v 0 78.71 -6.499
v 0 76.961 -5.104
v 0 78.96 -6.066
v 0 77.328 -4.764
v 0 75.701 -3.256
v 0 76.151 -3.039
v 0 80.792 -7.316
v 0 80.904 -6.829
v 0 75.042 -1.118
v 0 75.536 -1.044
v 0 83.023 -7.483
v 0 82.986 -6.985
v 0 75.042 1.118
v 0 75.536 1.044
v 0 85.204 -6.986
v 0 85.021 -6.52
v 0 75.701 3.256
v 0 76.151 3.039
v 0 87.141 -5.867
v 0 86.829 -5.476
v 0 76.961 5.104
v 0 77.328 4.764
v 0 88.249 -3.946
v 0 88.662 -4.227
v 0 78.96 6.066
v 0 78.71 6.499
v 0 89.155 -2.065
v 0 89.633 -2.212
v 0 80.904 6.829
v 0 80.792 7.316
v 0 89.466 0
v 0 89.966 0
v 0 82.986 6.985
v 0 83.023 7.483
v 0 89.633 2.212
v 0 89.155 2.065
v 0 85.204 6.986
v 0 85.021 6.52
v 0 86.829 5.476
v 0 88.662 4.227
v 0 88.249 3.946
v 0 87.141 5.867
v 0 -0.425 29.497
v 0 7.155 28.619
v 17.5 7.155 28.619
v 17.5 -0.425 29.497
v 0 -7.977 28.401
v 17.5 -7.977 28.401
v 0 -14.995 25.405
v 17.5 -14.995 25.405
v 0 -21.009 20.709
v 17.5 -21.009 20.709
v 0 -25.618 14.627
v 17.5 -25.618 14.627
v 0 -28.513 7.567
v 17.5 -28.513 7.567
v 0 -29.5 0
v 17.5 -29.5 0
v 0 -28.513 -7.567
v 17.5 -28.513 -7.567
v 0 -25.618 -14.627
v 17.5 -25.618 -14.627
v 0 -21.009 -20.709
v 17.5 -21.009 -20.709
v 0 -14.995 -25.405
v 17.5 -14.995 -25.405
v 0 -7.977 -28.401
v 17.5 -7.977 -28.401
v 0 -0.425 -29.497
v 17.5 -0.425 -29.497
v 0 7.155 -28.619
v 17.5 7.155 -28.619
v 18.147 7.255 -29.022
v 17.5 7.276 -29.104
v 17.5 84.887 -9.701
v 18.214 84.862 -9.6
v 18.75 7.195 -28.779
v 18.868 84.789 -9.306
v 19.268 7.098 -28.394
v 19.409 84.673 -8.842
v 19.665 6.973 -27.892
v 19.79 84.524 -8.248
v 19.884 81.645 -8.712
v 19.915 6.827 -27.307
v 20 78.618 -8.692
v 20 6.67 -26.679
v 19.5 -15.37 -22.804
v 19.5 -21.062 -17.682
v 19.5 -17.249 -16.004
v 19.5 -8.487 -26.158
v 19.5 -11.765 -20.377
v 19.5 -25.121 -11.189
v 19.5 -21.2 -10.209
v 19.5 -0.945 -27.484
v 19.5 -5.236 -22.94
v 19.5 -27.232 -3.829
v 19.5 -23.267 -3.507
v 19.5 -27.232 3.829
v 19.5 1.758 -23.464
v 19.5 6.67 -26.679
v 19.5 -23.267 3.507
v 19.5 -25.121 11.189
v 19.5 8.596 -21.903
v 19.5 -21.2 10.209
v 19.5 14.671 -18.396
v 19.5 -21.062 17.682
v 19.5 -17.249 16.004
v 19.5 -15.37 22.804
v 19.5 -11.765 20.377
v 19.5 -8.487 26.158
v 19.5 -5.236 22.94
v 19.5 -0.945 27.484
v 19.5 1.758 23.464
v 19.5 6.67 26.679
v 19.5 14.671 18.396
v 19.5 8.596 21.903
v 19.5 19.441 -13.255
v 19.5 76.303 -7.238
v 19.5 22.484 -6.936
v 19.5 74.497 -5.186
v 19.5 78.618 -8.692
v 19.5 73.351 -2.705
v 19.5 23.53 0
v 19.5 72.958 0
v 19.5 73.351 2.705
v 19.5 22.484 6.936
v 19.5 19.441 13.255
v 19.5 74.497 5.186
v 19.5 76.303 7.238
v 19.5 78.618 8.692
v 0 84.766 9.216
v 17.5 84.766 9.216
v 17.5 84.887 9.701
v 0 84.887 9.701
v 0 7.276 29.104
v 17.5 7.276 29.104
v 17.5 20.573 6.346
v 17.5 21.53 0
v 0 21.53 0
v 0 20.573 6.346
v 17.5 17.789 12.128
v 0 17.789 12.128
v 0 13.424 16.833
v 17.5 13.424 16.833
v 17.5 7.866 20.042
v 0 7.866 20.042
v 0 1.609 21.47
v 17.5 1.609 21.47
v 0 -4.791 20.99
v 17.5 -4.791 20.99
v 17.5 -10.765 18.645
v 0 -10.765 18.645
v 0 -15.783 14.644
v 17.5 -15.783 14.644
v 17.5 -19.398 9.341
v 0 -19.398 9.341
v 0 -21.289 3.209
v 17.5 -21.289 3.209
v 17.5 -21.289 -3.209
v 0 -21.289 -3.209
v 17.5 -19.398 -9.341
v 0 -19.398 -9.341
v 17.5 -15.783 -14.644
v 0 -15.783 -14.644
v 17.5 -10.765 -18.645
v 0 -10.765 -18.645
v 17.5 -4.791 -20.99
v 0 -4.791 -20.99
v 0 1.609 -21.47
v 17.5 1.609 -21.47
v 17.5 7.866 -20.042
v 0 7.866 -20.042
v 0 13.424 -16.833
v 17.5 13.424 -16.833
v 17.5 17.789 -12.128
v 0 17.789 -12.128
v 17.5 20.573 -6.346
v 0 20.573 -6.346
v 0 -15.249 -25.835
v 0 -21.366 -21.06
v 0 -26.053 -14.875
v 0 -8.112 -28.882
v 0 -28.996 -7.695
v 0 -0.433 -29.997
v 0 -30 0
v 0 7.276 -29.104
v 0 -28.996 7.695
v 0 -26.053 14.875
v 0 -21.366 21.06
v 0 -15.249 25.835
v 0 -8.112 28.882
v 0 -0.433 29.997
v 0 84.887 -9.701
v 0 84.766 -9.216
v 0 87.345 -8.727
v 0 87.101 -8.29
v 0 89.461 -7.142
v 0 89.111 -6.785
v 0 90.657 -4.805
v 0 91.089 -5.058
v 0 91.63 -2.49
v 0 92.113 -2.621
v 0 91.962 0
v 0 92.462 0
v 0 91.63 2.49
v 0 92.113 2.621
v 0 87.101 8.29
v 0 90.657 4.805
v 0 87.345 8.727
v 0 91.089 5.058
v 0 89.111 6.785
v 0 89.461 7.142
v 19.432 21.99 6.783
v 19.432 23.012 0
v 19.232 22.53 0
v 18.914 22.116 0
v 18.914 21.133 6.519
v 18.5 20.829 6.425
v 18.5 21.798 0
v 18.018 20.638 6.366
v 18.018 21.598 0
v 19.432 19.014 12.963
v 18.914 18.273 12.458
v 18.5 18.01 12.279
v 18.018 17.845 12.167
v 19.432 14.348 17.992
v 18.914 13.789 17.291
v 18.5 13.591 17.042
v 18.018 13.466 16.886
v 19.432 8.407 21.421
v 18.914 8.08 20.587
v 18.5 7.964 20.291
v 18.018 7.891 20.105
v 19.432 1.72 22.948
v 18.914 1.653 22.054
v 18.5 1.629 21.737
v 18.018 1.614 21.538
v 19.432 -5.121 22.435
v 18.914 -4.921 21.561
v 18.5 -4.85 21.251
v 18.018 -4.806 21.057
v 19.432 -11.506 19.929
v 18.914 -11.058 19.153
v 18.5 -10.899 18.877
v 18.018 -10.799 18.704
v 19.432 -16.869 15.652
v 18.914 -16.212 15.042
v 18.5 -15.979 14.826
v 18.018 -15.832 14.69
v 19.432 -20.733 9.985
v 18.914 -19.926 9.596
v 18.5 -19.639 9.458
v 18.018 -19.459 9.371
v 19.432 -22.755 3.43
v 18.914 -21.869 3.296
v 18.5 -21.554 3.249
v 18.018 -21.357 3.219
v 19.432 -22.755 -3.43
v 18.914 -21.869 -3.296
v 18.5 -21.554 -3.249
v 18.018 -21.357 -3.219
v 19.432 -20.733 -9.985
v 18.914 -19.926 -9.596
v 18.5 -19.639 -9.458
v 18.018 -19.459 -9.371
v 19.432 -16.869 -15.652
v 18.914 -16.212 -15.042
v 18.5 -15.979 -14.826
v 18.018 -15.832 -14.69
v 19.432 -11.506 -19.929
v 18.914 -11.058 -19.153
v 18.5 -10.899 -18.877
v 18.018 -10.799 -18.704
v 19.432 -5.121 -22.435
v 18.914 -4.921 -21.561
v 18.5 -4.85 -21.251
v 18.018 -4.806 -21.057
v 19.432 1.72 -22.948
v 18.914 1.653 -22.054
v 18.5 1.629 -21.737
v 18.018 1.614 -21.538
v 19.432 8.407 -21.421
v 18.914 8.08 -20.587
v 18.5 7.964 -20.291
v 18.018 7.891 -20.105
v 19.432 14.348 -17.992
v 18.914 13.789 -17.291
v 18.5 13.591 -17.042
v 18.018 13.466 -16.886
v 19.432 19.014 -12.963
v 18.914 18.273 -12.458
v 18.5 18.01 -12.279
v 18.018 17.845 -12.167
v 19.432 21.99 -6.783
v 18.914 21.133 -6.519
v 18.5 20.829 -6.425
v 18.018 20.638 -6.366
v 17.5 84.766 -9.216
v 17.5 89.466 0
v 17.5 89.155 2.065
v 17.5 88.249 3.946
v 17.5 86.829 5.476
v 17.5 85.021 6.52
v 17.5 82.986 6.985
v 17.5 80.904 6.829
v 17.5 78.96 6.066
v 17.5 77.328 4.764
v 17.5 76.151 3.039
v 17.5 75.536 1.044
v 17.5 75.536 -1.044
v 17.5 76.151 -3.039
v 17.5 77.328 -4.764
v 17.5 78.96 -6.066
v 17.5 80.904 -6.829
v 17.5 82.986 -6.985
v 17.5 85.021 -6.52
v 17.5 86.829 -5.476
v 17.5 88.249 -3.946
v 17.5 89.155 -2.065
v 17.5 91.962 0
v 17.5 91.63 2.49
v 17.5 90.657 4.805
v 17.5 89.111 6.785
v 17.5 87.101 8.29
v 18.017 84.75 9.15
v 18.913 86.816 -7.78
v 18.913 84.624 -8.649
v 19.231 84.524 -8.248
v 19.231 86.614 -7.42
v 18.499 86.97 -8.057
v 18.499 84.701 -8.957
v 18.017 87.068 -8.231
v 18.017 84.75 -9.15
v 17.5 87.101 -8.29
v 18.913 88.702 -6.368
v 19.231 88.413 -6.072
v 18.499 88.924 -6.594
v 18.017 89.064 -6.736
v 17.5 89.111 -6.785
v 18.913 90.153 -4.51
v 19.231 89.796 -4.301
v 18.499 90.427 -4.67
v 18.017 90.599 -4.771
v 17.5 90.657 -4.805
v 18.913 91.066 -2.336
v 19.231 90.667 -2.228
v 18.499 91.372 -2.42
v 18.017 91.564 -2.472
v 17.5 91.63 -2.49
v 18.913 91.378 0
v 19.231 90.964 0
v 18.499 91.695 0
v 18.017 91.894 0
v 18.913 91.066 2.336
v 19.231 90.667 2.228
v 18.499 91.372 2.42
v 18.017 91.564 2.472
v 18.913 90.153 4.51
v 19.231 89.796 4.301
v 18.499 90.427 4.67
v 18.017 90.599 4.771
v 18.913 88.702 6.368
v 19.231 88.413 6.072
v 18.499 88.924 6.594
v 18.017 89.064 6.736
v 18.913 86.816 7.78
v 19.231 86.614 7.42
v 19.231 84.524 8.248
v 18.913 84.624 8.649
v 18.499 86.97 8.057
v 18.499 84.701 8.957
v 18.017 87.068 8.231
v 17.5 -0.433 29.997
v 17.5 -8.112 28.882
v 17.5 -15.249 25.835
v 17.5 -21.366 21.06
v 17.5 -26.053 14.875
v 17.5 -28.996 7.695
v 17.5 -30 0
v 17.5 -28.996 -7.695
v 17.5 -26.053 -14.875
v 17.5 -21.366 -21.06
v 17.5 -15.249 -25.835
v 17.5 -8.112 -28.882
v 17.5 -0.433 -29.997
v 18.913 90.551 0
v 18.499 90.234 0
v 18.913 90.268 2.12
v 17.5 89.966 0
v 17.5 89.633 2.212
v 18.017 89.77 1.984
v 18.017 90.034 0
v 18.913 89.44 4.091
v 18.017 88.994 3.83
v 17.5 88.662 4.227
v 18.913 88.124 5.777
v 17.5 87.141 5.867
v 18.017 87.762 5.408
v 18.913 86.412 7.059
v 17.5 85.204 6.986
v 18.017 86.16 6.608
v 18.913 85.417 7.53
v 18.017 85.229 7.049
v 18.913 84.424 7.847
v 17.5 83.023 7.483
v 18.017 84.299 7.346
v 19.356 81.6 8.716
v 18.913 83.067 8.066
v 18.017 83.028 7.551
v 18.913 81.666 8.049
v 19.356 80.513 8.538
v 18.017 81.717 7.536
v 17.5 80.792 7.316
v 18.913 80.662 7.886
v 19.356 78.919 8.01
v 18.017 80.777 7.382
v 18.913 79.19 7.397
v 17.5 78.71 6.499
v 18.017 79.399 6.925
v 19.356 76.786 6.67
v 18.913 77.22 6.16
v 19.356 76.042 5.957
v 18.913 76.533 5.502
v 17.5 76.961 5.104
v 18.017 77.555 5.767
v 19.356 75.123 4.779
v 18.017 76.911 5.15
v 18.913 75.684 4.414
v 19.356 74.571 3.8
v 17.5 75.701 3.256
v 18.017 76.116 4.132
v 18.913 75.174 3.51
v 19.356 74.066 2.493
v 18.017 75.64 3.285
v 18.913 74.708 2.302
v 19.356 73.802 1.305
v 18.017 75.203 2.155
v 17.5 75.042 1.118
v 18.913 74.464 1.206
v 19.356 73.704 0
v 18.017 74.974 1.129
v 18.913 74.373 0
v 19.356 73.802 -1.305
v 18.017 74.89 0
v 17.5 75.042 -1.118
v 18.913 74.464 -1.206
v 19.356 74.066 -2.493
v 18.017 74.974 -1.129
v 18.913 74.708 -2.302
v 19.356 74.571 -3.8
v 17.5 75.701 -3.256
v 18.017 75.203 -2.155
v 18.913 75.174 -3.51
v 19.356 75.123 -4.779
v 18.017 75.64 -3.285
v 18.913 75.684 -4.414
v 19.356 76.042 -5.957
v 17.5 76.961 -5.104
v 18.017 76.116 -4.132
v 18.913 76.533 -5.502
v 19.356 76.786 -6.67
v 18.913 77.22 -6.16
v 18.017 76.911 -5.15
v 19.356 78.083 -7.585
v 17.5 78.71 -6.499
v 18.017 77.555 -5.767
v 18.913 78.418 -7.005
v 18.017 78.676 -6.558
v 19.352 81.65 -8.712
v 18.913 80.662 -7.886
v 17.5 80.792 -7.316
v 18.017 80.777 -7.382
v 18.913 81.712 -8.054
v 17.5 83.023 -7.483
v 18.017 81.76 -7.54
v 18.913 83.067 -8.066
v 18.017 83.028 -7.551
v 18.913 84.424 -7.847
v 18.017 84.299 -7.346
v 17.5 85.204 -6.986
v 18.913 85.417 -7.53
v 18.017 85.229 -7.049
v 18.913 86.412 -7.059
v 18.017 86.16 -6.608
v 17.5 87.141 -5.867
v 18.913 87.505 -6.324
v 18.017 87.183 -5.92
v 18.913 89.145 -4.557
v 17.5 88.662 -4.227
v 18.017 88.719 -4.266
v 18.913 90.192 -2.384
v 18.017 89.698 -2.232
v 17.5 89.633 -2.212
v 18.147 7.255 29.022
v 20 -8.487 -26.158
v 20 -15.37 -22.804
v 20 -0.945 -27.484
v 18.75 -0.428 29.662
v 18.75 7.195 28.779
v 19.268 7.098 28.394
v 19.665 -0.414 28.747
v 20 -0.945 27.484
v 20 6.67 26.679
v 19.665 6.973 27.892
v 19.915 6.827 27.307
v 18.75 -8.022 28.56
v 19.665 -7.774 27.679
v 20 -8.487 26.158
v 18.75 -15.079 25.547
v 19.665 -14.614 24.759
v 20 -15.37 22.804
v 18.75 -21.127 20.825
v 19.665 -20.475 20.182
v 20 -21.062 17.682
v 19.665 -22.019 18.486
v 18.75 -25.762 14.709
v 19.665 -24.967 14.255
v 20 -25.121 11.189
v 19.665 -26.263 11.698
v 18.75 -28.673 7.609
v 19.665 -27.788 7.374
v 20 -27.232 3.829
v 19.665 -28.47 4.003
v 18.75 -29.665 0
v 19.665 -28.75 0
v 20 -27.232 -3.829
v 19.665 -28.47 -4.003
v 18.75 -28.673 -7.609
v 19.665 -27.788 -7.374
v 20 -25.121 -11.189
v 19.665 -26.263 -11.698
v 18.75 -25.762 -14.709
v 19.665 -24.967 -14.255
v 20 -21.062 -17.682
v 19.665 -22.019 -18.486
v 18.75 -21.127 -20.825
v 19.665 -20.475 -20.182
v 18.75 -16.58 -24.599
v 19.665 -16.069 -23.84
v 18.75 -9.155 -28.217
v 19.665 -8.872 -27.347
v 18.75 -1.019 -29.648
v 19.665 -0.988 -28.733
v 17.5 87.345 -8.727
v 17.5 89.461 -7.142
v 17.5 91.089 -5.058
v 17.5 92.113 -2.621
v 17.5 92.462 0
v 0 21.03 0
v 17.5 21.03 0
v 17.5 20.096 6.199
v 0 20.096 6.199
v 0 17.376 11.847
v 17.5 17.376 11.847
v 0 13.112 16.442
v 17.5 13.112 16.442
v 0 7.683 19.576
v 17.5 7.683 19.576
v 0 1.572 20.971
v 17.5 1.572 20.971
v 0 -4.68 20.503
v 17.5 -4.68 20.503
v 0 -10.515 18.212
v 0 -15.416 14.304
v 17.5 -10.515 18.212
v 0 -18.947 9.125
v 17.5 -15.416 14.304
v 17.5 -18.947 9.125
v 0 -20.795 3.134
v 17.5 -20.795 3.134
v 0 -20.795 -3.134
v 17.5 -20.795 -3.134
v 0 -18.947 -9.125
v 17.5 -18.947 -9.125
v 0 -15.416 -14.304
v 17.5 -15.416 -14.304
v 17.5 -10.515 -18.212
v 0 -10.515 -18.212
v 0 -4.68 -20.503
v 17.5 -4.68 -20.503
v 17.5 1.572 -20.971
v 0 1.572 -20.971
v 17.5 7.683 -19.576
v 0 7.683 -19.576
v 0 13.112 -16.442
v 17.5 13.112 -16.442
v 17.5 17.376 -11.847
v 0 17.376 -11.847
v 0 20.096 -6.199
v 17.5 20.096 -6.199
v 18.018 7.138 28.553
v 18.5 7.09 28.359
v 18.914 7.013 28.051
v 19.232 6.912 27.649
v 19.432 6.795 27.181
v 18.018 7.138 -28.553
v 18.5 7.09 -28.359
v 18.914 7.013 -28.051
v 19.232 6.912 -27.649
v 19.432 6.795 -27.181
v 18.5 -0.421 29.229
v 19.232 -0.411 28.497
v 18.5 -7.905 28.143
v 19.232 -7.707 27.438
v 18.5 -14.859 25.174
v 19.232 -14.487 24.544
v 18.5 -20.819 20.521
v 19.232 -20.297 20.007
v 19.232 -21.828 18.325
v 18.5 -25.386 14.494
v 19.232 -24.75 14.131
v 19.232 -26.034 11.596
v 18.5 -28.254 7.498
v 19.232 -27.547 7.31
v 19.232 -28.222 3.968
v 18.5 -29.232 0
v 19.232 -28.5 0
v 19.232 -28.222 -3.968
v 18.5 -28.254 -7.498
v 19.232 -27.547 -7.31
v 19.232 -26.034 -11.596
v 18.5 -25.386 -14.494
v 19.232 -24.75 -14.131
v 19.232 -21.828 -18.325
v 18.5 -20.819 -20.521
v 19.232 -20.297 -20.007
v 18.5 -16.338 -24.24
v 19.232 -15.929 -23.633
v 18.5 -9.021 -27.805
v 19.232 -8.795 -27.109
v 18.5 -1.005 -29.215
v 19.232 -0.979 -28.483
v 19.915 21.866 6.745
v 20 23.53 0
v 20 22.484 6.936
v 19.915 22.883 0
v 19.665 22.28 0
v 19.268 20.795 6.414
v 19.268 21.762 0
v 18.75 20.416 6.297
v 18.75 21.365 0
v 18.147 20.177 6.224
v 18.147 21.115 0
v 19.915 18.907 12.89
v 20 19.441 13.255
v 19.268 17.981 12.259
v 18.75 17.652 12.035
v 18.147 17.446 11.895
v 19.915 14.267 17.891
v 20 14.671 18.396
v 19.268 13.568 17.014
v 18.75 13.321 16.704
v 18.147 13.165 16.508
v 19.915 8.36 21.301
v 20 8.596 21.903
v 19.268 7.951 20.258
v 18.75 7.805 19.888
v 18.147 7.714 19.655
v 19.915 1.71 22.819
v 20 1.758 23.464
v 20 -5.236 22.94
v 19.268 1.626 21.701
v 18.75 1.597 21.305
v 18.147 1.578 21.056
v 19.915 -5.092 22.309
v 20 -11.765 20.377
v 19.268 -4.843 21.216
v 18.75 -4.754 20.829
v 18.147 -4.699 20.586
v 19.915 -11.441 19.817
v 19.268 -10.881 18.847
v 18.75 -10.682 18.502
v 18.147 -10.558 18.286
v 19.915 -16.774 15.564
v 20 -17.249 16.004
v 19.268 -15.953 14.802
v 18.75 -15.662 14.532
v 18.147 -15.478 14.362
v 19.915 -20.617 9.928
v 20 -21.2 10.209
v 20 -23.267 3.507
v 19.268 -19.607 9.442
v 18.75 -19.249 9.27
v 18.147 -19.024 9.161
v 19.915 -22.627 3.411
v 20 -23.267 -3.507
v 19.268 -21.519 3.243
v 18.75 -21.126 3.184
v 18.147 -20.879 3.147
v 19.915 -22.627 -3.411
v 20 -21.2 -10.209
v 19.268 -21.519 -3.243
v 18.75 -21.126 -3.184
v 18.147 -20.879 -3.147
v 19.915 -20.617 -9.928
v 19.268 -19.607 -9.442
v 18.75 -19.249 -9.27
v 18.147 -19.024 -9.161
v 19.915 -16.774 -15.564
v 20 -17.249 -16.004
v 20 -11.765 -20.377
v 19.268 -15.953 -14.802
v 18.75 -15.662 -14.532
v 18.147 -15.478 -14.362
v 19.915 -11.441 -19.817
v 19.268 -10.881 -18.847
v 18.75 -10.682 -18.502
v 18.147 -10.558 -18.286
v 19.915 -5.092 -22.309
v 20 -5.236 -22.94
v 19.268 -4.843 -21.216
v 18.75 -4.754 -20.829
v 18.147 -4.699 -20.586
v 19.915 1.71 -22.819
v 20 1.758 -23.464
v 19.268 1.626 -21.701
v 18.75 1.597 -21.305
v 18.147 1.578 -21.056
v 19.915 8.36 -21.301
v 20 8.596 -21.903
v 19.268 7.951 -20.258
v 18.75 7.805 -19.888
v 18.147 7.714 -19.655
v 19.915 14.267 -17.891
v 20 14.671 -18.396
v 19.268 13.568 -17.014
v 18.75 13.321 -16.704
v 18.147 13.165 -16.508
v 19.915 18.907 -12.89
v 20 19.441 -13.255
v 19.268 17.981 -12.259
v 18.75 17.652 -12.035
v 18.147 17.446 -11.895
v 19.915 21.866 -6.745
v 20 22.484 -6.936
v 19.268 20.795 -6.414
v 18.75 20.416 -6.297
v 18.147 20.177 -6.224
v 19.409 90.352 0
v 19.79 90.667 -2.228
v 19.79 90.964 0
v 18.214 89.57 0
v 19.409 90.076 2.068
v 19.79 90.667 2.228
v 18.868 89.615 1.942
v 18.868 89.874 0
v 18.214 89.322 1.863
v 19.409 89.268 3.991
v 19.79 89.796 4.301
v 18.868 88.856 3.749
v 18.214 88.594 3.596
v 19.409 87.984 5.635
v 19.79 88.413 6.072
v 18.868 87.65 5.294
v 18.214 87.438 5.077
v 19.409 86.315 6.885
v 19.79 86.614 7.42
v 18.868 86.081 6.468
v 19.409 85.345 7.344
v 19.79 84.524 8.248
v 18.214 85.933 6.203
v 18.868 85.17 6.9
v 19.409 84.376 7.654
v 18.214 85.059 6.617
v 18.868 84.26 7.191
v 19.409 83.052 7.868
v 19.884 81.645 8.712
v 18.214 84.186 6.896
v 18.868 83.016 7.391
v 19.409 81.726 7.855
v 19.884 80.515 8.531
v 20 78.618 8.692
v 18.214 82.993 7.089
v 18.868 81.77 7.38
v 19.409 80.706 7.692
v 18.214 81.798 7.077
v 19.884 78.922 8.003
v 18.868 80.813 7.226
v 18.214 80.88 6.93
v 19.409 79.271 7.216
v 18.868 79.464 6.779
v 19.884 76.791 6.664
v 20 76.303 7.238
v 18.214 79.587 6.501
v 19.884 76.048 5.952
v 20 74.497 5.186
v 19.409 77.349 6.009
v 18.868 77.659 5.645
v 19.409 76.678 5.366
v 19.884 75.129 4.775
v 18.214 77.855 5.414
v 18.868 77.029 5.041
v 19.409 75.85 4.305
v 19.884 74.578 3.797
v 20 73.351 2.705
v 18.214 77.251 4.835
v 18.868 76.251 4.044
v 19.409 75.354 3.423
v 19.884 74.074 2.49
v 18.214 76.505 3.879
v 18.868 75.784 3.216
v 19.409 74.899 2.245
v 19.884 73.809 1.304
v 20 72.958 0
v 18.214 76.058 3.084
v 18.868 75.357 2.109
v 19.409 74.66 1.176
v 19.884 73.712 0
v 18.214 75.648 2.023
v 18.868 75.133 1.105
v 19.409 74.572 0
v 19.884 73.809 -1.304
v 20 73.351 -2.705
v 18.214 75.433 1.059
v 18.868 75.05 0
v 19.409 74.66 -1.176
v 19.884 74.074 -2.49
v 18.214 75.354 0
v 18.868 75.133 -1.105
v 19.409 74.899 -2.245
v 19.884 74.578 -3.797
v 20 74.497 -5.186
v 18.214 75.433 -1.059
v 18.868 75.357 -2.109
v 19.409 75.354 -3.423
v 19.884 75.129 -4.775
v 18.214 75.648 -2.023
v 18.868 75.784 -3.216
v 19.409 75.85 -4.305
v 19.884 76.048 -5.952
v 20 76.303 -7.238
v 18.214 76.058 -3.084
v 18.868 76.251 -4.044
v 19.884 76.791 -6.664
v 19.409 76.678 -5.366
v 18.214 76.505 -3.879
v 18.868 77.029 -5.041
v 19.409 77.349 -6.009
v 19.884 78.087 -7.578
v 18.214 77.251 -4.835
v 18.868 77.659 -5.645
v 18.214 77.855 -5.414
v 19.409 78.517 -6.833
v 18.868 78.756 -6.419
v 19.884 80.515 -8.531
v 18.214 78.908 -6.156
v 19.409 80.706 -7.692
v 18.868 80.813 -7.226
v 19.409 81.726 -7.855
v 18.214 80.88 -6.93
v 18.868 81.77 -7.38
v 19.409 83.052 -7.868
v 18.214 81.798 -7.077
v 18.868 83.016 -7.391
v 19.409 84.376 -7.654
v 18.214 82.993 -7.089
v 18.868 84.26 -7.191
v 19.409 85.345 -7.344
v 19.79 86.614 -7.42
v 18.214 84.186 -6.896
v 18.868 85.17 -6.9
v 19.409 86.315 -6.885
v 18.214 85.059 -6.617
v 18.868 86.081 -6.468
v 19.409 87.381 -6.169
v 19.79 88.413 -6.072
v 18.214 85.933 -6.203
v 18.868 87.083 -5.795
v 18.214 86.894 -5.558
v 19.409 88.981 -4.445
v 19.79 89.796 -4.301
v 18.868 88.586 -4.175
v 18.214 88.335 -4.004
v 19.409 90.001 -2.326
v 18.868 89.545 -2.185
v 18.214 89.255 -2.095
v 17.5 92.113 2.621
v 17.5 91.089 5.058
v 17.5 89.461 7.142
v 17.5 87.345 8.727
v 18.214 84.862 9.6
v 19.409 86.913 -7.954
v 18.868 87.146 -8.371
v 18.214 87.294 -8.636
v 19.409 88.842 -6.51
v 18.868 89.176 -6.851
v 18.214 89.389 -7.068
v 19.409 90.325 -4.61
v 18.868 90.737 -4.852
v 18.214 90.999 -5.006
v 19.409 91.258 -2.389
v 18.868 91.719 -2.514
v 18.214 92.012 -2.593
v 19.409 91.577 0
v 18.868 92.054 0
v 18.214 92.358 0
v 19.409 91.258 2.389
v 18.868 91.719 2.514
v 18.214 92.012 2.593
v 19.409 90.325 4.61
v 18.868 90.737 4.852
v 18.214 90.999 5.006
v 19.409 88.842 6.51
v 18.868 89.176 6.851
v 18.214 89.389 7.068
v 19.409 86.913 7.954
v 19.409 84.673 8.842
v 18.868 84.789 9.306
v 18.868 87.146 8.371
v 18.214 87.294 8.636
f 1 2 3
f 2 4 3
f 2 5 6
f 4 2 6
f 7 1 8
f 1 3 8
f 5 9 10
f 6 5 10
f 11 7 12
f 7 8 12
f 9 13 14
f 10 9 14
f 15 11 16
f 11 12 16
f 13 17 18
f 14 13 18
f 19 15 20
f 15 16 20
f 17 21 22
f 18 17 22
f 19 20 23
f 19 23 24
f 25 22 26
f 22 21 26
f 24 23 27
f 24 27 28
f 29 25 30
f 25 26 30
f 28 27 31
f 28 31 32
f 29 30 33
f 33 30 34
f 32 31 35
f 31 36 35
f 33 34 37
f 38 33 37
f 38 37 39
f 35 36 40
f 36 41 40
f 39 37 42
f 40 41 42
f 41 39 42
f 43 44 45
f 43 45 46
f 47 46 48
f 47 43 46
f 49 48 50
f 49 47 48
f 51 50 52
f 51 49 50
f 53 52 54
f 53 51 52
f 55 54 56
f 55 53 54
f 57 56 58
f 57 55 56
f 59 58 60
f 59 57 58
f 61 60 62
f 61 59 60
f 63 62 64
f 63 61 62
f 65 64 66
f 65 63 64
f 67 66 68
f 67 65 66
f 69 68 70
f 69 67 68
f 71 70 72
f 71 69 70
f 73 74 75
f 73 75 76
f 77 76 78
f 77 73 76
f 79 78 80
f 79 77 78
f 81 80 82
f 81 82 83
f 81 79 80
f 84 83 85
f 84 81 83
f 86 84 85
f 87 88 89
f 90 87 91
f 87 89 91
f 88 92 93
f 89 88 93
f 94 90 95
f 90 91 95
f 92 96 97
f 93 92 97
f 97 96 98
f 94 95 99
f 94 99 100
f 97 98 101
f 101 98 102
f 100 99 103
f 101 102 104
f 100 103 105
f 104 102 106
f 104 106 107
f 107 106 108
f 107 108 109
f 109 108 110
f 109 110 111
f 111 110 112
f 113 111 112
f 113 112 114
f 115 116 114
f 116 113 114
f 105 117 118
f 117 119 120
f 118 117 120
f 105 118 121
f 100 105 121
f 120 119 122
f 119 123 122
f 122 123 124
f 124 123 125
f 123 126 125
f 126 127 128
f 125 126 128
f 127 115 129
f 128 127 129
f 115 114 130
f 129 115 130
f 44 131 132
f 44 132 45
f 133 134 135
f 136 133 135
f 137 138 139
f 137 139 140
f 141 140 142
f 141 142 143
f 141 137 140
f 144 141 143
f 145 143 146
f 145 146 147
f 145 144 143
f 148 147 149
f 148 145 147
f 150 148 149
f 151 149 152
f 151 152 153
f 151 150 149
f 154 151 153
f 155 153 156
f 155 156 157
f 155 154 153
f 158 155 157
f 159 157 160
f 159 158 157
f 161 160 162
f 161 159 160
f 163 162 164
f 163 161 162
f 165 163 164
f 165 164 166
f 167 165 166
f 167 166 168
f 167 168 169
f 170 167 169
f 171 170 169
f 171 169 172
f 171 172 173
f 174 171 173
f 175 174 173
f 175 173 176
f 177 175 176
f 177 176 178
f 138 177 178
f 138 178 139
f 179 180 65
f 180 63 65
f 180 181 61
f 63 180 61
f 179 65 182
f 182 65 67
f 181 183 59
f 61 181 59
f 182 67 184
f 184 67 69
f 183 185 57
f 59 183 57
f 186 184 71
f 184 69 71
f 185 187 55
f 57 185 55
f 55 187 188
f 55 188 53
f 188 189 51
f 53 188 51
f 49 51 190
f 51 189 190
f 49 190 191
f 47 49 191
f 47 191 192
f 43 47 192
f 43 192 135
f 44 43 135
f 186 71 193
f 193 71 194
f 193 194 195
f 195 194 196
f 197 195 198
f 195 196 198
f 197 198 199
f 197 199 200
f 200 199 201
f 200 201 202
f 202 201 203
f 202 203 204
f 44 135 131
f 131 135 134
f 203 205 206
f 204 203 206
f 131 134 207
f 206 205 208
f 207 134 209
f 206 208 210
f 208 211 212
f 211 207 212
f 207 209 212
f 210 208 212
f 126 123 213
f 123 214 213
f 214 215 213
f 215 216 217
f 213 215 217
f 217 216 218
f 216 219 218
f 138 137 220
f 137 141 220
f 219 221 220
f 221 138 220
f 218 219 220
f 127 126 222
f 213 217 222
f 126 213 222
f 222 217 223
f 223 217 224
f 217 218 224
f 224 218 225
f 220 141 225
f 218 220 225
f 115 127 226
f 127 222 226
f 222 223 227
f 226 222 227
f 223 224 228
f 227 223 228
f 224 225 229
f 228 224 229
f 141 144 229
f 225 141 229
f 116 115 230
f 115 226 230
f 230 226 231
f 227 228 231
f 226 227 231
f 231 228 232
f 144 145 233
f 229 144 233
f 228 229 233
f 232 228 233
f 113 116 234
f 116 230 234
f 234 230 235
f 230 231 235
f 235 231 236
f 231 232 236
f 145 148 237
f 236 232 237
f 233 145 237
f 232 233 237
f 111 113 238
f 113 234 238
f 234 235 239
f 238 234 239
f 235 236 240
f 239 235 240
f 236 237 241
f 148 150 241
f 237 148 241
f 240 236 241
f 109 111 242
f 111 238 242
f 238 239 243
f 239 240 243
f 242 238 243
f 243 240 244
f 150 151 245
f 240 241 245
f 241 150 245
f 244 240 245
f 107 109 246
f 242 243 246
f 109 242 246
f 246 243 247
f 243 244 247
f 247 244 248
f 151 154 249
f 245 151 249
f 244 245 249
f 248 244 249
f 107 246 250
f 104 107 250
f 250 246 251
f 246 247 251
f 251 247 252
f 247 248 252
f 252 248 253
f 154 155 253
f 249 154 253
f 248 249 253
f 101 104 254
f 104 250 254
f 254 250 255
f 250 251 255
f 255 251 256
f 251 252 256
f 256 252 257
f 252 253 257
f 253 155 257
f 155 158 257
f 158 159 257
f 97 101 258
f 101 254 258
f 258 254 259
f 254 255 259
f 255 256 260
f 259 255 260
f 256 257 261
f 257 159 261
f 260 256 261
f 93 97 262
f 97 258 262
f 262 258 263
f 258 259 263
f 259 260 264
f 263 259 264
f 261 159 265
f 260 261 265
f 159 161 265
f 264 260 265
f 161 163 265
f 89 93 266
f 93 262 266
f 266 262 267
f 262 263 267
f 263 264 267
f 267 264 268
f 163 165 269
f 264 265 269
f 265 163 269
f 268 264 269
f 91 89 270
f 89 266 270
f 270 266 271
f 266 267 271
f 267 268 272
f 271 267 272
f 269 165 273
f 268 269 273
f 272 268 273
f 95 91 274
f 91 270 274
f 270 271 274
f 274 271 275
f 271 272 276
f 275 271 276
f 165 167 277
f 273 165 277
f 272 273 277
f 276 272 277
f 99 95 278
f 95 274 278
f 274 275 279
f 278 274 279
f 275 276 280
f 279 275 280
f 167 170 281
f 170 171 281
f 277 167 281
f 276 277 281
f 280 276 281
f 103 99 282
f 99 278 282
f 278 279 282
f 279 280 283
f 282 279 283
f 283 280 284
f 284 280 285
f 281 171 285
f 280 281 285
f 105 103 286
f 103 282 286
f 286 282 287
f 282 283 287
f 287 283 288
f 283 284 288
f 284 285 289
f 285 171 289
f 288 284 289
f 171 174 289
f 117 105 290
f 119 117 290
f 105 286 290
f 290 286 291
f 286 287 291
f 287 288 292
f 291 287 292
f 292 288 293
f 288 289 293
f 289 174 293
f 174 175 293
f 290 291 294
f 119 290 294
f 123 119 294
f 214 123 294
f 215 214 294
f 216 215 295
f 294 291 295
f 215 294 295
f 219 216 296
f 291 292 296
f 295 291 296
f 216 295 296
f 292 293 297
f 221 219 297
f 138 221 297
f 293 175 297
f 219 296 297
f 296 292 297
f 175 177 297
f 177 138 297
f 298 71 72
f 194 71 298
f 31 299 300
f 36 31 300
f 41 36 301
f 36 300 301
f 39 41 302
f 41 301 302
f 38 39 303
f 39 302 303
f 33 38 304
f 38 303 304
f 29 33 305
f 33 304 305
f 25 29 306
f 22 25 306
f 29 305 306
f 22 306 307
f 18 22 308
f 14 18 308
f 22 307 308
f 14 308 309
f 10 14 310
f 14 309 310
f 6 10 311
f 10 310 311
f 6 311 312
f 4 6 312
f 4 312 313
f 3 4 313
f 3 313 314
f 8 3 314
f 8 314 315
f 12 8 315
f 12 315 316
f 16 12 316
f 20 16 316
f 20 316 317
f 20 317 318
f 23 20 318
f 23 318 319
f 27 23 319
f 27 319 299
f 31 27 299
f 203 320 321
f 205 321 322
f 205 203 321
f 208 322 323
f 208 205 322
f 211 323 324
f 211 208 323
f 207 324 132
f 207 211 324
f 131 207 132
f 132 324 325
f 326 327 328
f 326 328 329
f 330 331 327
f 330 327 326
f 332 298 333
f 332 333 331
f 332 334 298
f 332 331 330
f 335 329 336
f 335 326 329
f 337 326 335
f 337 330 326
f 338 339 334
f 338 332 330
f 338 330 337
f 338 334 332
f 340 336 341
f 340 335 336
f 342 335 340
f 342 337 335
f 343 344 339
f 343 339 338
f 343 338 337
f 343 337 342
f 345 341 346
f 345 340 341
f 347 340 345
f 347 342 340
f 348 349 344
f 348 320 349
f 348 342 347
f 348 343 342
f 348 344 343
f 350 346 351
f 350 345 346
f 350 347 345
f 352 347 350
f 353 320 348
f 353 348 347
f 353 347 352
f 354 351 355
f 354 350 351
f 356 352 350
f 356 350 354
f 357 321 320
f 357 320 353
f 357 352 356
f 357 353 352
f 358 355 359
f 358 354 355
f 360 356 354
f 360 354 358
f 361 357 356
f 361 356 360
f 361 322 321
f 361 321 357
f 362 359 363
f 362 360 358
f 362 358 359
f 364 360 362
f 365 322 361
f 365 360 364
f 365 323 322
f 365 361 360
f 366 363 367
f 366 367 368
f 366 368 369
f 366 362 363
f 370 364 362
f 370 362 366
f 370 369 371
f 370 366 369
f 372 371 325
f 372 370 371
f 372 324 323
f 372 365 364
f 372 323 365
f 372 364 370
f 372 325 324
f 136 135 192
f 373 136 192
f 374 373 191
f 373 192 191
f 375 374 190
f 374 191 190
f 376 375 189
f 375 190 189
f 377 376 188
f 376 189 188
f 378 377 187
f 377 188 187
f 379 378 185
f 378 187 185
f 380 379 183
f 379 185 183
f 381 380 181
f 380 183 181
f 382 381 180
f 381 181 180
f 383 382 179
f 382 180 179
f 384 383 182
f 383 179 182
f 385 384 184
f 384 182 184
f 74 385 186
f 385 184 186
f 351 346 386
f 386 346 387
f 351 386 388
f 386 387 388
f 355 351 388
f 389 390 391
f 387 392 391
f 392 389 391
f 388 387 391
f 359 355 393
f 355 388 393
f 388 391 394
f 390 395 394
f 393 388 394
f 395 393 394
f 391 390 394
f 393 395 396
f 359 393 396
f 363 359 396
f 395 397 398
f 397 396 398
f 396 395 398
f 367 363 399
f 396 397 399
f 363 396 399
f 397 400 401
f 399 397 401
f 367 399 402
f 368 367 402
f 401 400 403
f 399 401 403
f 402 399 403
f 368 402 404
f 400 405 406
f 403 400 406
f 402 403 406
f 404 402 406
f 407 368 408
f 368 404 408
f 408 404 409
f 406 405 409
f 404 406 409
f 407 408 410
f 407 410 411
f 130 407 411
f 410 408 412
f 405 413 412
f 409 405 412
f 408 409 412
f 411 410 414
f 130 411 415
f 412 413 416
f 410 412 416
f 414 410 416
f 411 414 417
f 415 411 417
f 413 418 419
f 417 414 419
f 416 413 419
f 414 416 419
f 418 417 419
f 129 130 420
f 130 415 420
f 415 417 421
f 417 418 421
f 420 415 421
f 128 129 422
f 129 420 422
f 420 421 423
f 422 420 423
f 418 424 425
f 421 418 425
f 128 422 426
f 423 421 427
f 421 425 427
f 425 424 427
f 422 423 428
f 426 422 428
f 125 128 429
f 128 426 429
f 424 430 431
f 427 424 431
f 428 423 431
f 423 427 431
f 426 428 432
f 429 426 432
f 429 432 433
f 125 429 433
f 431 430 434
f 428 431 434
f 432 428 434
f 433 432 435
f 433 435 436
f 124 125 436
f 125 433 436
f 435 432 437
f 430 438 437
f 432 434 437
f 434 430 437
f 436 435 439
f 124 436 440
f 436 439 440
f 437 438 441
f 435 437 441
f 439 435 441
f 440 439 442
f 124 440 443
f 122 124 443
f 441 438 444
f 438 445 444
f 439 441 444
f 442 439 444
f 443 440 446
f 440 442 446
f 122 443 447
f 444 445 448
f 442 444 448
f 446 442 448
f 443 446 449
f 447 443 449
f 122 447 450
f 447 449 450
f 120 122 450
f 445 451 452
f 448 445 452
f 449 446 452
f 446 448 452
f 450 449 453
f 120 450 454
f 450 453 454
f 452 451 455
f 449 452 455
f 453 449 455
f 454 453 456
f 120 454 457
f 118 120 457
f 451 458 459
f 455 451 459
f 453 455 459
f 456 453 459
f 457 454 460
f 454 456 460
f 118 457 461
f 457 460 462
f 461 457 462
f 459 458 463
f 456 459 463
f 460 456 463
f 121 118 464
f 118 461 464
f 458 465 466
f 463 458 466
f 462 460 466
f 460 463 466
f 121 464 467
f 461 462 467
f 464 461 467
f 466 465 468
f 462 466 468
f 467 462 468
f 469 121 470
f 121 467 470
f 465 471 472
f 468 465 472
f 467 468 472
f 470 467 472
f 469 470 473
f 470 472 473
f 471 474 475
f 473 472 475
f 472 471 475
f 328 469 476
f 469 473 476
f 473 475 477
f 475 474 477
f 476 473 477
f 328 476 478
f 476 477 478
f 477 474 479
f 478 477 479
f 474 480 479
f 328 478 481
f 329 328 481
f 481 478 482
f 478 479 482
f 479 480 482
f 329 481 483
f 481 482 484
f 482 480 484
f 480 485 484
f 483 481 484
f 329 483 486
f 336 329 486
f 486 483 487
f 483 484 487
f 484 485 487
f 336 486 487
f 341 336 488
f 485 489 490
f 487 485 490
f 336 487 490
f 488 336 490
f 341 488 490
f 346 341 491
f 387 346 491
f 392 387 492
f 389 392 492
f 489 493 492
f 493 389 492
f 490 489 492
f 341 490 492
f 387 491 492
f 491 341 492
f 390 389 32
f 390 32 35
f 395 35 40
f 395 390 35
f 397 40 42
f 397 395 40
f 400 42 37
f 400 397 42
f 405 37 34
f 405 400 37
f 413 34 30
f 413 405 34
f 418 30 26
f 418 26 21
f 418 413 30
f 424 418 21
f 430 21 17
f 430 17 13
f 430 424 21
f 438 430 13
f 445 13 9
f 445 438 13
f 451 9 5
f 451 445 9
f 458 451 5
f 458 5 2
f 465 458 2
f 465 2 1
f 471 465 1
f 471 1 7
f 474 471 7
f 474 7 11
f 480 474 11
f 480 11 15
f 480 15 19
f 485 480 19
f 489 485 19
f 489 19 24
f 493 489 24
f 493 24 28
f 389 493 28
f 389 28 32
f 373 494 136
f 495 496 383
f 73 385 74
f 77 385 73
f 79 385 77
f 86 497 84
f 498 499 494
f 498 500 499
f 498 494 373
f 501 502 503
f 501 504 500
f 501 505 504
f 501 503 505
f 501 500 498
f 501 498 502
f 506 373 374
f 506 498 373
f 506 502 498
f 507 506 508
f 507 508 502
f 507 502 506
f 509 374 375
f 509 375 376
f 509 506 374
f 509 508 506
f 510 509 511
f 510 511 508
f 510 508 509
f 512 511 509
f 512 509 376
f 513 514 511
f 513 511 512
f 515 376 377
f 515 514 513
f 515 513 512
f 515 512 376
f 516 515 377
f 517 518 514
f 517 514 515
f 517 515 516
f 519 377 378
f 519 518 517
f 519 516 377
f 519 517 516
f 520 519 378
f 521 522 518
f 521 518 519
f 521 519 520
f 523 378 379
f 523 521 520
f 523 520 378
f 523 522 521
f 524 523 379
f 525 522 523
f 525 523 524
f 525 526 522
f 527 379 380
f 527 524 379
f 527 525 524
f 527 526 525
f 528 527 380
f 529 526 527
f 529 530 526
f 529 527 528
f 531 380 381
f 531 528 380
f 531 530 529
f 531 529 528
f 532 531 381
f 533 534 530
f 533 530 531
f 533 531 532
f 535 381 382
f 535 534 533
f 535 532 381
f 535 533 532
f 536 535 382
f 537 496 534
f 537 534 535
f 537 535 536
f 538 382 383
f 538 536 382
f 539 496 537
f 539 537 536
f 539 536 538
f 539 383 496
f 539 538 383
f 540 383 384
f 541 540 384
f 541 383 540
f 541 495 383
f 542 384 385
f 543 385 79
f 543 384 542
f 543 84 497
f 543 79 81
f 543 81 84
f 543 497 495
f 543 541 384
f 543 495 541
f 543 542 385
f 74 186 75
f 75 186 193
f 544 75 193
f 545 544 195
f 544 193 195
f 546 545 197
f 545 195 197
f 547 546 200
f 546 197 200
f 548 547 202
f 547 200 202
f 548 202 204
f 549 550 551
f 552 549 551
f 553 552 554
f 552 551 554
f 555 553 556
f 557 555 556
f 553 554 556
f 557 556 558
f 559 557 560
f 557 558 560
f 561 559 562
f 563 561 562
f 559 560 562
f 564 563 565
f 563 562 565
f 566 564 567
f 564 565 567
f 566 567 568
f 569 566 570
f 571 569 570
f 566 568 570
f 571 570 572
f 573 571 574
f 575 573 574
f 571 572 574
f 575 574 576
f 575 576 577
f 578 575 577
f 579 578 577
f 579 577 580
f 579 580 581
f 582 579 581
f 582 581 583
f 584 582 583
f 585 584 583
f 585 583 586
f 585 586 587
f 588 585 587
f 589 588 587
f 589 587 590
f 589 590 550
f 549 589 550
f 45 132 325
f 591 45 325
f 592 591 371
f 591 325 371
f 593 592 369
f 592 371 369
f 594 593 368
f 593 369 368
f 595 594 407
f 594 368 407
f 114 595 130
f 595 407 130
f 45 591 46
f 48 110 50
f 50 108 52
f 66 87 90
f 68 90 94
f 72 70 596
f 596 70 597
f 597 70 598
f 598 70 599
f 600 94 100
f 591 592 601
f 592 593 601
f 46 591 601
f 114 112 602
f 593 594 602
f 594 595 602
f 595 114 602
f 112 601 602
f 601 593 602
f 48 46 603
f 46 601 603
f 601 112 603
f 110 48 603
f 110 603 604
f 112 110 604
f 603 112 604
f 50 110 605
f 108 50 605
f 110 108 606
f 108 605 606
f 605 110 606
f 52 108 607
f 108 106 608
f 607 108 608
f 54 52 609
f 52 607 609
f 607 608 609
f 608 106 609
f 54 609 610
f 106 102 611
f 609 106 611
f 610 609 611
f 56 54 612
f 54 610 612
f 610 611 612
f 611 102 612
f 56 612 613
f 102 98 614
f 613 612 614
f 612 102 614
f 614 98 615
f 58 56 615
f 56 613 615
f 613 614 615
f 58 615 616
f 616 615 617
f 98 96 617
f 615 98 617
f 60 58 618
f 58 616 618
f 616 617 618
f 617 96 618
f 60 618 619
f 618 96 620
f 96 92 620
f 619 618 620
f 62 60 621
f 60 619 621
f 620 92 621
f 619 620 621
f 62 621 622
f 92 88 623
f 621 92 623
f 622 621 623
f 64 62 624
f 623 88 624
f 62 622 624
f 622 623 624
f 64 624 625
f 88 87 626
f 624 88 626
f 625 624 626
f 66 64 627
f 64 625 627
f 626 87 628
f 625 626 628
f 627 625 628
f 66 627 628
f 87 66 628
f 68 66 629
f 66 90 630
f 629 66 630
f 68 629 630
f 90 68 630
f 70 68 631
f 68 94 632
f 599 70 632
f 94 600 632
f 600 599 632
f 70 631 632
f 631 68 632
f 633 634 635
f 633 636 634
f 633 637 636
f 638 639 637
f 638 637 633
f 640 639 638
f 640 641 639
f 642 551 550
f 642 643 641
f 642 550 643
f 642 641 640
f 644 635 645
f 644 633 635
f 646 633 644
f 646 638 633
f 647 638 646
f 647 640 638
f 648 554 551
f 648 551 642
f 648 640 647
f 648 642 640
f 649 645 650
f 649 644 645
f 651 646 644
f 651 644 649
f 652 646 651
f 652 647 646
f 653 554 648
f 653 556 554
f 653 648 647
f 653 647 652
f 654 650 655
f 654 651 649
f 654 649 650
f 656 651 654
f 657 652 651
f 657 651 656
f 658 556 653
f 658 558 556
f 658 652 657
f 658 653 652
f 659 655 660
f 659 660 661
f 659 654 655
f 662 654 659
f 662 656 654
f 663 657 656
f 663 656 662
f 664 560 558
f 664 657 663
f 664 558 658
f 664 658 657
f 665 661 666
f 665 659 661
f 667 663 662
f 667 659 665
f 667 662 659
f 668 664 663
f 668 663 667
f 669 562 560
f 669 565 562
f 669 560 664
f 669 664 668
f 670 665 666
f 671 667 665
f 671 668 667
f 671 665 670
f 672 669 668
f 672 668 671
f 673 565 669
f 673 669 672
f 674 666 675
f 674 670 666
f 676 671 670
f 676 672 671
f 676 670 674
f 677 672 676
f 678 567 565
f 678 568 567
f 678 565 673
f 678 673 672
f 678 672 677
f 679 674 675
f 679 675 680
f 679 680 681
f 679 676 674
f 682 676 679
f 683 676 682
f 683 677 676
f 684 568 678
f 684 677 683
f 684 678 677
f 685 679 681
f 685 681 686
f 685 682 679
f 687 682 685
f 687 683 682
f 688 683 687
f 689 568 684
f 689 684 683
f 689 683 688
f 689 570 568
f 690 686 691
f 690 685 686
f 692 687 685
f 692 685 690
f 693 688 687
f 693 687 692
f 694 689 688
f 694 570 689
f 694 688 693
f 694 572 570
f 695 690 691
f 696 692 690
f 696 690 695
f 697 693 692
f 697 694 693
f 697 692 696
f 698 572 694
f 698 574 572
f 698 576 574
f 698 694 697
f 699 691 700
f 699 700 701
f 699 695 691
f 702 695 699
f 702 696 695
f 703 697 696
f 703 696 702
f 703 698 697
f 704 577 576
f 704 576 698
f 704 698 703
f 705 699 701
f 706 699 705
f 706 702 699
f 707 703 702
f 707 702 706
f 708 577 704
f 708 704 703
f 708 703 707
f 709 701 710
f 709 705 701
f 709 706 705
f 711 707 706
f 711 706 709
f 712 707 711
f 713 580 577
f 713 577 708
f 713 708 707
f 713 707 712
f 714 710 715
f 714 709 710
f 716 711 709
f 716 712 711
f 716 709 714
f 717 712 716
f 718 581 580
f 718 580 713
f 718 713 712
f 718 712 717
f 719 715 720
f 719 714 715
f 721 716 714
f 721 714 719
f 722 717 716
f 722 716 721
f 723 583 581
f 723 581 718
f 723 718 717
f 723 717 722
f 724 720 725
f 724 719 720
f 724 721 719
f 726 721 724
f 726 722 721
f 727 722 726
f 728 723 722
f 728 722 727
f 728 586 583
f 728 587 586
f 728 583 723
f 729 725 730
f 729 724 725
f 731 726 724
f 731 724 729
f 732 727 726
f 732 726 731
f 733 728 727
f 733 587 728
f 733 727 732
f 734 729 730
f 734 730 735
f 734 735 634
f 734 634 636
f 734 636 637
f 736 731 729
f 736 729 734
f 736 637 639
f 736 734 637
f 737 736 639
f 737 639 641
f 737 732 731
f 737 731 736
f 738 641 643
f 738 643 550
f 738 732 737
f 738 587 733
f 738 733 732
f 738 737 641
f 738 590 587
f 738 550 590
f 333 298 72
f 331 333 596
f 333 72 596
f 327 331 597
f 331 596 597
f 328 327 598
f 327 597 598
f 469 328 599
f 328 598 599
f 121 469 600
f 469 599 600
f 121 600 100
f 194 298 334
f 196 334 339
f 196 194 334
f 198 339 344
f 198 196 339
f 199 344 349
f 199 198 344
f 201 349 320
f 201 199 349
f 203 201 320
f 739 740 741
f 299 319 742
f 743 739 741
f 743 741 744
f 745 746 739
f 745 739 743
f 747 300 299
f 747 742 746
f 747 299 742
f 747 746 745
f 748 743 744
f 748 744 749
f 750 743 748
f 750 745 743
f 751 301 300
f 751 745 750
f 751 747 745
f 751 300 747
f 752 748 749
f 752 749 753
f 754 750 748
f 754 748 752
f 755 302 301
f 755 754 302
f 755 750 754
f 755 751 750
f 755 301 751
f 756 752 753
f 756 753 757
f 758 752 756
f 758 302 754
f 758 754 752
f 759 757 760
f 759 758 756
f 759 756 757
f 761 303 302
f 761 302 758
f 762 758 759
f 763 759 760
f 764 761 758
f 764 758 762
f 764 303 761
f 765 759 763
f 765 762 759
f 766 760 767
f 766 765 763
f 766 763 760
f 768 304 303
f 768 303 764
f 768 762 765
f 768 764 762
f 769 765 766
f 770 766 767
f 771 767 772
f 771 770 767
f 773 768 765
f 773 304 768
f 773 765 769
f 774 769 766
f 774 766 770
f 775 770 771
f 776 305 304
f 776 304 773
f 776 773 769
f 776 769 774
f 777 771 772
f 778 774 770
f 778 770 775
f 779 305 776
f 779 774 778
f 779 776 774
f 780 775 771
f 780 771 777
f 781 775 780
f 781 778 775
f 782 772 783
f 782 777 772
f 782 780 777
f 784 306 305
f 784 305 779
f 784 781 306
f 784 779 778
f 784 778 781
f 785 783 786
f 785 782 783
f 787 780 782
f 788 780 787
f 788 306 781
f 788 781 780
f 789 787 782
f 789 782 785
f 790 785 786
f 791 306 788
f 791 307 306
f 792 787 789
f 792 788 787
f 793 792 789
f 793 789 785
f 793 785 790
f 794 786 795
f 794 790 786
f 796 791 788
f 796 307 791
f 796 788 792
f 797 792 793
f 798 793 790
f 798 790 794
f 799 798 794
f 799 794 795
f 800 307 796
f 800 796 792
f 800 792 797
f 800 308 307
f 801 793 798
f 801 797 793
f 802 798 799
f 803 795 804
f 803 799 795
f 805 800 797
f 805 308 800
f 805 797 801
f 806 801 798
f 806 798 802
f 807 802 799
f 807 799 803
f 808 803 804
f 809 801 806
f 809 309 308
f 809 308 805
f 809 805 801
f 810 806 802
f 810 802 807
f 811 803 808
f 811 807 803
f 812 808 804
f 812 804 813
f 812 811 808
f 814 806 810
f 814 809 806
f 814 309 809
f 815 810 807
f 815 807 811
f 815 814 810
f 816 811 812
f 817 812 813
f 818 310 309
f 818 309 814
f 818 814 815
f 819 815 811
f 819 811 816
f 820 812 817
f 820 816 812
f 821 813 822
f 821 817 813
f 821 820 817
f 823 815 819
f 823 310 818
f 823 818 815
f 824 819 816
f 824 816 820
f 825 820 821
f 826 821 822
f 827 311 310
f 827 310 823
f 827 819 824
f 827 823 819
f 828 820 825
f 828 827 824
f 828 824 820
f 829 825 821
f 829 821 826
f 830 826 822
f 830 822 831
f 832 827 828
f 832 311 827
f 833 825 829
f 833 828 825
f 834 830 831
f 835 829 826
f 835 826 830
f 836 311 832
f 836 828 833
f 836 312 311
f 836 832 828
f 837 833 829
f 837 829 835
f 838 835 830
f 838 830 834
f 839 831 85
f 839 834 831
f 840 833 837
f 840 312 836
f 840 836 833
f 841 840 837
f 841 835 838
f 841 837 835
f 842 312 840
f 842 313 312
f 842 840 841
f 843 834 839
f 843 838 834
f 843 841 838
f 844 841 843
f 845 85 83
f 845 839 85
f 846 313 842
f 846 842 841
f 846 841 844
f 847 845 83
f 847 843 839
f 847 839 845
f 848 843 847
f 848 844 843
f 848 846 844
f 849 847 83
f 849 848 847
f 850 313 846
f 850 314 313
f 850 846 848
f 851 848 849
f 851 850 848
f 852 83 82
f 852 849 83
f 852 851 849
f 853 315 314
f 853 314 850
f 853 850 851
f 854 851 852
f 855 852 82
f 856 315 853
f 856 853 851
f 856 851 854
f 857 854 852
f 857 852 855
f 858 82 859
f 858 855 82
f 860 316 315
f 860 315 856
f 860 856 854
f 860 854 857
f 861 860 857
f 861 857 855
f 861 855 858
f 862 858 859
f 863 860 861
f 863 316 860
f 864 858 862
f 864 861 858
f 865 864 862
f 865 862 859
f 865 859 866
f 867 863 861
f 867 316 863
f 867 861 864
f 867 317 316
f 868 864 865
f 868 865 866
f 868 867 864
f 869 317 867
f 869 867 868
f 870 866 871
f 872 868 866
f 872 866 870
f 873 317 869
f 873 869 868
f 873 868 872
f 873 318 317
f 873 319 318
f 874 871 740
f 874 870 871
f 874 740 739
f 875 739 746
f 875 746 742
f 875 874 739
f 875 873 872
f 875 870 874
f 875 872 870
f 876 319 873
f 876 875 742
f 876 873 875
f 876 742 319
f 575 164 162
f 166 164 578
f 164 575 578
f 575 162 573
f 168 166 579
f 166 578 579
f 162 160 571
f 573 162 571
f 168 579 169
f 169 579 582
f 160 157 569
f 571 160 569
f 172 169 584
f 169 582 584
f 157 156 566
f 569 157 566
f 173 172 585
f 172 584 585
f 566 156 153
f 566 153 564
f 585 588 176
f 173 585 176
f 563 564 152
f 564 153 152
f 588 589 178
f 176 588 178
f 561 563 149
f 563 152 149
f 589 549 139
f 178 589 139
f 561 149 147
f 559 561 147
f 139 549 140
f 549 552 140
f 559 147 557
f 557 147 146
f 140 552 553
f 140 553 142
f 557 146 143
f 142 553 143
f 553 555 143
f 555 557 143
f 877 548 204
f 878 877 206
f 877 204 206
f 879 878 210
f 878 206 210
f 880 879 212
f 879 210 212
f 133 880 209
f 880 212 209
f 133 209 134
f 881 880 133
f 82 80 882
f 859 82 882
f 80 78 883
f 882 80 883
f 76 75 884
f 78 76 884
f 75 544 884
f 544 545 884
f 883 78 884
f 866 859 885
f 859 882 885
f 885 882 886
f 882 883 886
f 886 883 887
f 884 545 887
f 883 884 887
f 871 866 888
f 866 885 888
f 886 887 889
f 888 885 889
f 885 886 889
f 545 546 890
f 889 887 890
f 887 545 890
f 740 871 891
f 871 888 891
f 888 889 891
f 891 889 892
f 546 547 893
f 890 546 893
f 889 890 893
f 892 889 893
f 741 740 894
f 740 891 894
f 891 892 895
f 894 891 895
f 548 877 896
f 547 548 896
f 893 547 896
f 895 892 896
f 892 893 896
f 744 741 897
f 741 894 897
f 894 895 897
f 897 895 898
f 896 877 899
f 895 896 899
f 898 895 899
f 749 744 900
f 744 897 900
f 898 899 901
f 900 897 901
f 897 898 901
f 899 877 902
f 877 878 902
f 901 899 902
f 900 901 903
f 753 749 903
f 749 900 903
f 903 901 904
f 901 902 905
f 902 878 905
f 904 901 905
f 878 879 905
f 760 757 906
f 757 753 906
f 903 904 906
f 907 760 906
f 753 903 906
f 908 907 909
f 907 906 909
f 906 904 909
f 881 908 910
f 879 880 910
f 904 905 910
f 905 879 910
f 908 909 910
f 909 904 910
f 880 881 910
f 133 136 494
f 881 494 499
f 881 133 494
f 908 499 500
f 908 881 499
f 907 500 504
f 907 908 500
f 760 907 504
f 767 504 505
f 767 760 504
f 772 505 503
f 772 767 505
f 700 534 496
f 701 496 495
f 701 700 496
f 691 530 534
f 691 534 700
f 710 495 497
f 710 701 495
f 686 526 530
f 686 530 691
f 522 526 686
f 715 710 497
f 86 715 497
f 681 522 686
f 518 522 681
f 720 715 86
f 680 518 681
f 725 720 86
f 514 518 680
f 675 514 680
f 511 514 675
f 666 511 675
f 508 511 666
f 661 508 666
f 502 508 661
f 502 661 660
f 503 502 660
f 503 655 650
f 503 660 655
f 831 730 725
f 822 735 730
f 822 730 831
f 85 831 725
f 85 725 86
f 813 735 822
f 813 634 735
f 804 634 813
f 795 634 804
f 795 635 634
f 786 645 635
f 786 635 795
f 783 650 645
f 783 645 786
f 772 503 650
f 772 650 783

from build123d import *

# Parameters (mm, degrees)
F1_DEPTH    = 20
F2_R        = 7.0042863138
F2_R_2      = 21.0298639767
F3_DEPTH    = 20
F4_T1_DEPTH = 80
F4_T3_DEPTH = 80
F4_T6_ANGLE = 208.0724869359
F4_T8_ANGLE = 151.9275130641
F5_T        = -0.5


# Not quite as in the source:
# - a fillet or chamfer that OpenCascade refuses, or shapes differently, is made with other operations: its cross-section is extruded or revolved along the edge and cut away or added


with BuildPart() as f1:
    # F0 (on Right) → F1 (new body)
    with BuildSketch(Plane.YZ):
        with BuildLine():
            ThreePointArc((7.2760687511, -29.1042750044), (23.6461631405, -18.4623662821), (30, 0))
            ThreePointArc((30, 0), (23.6461631405, 18.4623662821), (7.2760687511, 29.1042750044))
            ThreePointArc((7.2760687511, 29.1042750044), (-30, 0), (7.2760687511, -29.1042750044))
        make_face()
        with BuildLine():
            ThreePointArc((7.2760687511, 29.1042750044), (23.6461631405, 18.4623662821), (30, 0))
            ThreePointArc((30, 0), (23.6461631405, -18.4623662821), (7.2760687511, -29.1042750044))
            Line((7.2760687511, -29.1042750044), (84.8874687627, -9.7014250015))
            ThreePointArc((84.8874687627, -9.7014250015), (72.4621125124, 0), (84.8874687627, 9.7014250015))
            Line((84.8874687627, 9.7014250015), (7.2760687511, 29.1042750044))
        make_face()
        with BuildLine():
            ThreePointArc((92.4621125124, 0), (90.3441668925, 6.154122094), (84.8874687627, 9.7014250015))
            ThreePointArc((84.8874687627, 9.7014250015), (72.4621125124, 0), (84.8874687627, -9.7014250015))
            ThreePointArc((84.8874687627, -9.7014250015), (90.3441668925, -6.154122094), (92.4621125124, 0))
        make_face()
    extrude(amount=F1_DEPTH)

    # F2 (on face) → F3 (cut)
    with BuildSketch(Plane.YZ.offset(20)):
        with Locations((82.4621125124, 0)):
            Circle(F2_R)
        Circle(F2_R_2)
    extrude(amount=-F3_DEPTH, mode=Mode.SUBTRACT)

    # F4: fillet of radius 2.5 on 6 edges, made by hand

    # F4_s2 → F4_t1 (cut)
    with BuildSketch(Plane(origin=(0, 77.6114000116, -19.4028500029), x_dir=(1, 0, 0), z_dir=(0, -0.9701425001, 0.242535625))):
        with BuildLine():
            ThreePointArc((17.5, 30), (19.267766953, 29.267766953), (20, 27.5))
            Line((20, 27.5), (20, 30))
            Line((20, 30), (17.5, 30))
        make_face()
    extrude(amount=F4_T1_DEPTH, mode=Mode.SUBTRACT)

    # F4_s4 → F4_t3 (cut)
    with BuildSketch(Plane(origin=(0, 0, 0), x_dir=(1, 0, 0), z_dir=(0, 0.9701425001, 0.242535625))):
        with BuildLine():
            ThreePointArc((17.5, 30), (19.267766953, 29.267766953), (20, 27.5))
            Line((20, 27.5), (20, 30))
            Line((20, 30), (17.5, 30))
        make_face()
    extrude(amount=F4_T3_DEPTH, mode=Mode.SUBTRACT)

    # F4_s5 → F4_t6 (revolve, cut)
    with BuildSketch(Plane(origin=(0, 0, 0), x_dir=(1, 0, 0), z_dir=(0, 0.9701425001, -0.242535625))):
        with BuildLine():
            ThreePointArc((17.5, -30), (19.267766953, -29.267766953), (20, -27.5))
            Line((20, -27.5), (20, -30))
            Line((20, -30), (17.5, -30))
        make_face()
    revolve(axis=Axis((20, 0, 0), (1, 0, 0)), revolution_arc=F4_T6_ANGLE, mode=Mode.SUBTRACT)

    # F4_s7 → F4_t8 (revolve, cut)
    with BuildSketch(Plane(origin=(0, 77.6114000116, 19.4028500029), x_dir=(1, 0, 0), z_dir=(0, -0.9701425001, -0.242535625))):
        with BuildLine():
            ThreePointArc((20, -27.5), (19.267766953, -29.267766953), (17.5, -30))
            Line((17.5, -30), (20, -30))
            Line((20, -30), (20, -27.5))
        make_face()
    revolve(axis=Axis((20, 82.4621125124, 0), (1, 0, 0)), revolution_arc=F4_T8_ANGLE, mode=Mode.SUBTRACT)

    # F4_s9 → F4_t10 (revolve, cut)
    with BuildSketch(Plane.XY):
        with BuildLine():
            ThreePointArc((20, 23.5298639767), (19.267766953, 21.7620970238), (17.5, 21.0298639767))
            Line((17.5, 21.0298639767), (20, 21.0298639767))
            Line((20, 21.0298639767), (20, 23.5298639767))
        make_face()
    revolve(axis=Axis((20, 0, 0), (1, 0, 0)), mode=Mode.SUBTRACT)

    # F4_s11 → F4_t12 (revolve, cut)
    with BuildSketch(Plane.XY):
        with BuildLine():
            ThreePointArc((20, 91.9663988262), (19.267766953, 90.1986318732), (17.5, 89.4663988262))
            Line((17.5, 89.4663988262), (20, 89.4663988262))
            Line((20, 89.4663988262), (20, 91.9663988262))
        make_face()
    revolve(axis=Axis((20, 82.4621125124, 0), (1, 0, 0)), mode=Mode.SUBTRACT)

    # F5
    f5_openings = [f1.faces().sort_by_distance(p)[0] for p in [
        (0, 29.143198, 0),
    ]]
    offset(amount=F5_T, openings=f5_openings)


solid = f1.part
